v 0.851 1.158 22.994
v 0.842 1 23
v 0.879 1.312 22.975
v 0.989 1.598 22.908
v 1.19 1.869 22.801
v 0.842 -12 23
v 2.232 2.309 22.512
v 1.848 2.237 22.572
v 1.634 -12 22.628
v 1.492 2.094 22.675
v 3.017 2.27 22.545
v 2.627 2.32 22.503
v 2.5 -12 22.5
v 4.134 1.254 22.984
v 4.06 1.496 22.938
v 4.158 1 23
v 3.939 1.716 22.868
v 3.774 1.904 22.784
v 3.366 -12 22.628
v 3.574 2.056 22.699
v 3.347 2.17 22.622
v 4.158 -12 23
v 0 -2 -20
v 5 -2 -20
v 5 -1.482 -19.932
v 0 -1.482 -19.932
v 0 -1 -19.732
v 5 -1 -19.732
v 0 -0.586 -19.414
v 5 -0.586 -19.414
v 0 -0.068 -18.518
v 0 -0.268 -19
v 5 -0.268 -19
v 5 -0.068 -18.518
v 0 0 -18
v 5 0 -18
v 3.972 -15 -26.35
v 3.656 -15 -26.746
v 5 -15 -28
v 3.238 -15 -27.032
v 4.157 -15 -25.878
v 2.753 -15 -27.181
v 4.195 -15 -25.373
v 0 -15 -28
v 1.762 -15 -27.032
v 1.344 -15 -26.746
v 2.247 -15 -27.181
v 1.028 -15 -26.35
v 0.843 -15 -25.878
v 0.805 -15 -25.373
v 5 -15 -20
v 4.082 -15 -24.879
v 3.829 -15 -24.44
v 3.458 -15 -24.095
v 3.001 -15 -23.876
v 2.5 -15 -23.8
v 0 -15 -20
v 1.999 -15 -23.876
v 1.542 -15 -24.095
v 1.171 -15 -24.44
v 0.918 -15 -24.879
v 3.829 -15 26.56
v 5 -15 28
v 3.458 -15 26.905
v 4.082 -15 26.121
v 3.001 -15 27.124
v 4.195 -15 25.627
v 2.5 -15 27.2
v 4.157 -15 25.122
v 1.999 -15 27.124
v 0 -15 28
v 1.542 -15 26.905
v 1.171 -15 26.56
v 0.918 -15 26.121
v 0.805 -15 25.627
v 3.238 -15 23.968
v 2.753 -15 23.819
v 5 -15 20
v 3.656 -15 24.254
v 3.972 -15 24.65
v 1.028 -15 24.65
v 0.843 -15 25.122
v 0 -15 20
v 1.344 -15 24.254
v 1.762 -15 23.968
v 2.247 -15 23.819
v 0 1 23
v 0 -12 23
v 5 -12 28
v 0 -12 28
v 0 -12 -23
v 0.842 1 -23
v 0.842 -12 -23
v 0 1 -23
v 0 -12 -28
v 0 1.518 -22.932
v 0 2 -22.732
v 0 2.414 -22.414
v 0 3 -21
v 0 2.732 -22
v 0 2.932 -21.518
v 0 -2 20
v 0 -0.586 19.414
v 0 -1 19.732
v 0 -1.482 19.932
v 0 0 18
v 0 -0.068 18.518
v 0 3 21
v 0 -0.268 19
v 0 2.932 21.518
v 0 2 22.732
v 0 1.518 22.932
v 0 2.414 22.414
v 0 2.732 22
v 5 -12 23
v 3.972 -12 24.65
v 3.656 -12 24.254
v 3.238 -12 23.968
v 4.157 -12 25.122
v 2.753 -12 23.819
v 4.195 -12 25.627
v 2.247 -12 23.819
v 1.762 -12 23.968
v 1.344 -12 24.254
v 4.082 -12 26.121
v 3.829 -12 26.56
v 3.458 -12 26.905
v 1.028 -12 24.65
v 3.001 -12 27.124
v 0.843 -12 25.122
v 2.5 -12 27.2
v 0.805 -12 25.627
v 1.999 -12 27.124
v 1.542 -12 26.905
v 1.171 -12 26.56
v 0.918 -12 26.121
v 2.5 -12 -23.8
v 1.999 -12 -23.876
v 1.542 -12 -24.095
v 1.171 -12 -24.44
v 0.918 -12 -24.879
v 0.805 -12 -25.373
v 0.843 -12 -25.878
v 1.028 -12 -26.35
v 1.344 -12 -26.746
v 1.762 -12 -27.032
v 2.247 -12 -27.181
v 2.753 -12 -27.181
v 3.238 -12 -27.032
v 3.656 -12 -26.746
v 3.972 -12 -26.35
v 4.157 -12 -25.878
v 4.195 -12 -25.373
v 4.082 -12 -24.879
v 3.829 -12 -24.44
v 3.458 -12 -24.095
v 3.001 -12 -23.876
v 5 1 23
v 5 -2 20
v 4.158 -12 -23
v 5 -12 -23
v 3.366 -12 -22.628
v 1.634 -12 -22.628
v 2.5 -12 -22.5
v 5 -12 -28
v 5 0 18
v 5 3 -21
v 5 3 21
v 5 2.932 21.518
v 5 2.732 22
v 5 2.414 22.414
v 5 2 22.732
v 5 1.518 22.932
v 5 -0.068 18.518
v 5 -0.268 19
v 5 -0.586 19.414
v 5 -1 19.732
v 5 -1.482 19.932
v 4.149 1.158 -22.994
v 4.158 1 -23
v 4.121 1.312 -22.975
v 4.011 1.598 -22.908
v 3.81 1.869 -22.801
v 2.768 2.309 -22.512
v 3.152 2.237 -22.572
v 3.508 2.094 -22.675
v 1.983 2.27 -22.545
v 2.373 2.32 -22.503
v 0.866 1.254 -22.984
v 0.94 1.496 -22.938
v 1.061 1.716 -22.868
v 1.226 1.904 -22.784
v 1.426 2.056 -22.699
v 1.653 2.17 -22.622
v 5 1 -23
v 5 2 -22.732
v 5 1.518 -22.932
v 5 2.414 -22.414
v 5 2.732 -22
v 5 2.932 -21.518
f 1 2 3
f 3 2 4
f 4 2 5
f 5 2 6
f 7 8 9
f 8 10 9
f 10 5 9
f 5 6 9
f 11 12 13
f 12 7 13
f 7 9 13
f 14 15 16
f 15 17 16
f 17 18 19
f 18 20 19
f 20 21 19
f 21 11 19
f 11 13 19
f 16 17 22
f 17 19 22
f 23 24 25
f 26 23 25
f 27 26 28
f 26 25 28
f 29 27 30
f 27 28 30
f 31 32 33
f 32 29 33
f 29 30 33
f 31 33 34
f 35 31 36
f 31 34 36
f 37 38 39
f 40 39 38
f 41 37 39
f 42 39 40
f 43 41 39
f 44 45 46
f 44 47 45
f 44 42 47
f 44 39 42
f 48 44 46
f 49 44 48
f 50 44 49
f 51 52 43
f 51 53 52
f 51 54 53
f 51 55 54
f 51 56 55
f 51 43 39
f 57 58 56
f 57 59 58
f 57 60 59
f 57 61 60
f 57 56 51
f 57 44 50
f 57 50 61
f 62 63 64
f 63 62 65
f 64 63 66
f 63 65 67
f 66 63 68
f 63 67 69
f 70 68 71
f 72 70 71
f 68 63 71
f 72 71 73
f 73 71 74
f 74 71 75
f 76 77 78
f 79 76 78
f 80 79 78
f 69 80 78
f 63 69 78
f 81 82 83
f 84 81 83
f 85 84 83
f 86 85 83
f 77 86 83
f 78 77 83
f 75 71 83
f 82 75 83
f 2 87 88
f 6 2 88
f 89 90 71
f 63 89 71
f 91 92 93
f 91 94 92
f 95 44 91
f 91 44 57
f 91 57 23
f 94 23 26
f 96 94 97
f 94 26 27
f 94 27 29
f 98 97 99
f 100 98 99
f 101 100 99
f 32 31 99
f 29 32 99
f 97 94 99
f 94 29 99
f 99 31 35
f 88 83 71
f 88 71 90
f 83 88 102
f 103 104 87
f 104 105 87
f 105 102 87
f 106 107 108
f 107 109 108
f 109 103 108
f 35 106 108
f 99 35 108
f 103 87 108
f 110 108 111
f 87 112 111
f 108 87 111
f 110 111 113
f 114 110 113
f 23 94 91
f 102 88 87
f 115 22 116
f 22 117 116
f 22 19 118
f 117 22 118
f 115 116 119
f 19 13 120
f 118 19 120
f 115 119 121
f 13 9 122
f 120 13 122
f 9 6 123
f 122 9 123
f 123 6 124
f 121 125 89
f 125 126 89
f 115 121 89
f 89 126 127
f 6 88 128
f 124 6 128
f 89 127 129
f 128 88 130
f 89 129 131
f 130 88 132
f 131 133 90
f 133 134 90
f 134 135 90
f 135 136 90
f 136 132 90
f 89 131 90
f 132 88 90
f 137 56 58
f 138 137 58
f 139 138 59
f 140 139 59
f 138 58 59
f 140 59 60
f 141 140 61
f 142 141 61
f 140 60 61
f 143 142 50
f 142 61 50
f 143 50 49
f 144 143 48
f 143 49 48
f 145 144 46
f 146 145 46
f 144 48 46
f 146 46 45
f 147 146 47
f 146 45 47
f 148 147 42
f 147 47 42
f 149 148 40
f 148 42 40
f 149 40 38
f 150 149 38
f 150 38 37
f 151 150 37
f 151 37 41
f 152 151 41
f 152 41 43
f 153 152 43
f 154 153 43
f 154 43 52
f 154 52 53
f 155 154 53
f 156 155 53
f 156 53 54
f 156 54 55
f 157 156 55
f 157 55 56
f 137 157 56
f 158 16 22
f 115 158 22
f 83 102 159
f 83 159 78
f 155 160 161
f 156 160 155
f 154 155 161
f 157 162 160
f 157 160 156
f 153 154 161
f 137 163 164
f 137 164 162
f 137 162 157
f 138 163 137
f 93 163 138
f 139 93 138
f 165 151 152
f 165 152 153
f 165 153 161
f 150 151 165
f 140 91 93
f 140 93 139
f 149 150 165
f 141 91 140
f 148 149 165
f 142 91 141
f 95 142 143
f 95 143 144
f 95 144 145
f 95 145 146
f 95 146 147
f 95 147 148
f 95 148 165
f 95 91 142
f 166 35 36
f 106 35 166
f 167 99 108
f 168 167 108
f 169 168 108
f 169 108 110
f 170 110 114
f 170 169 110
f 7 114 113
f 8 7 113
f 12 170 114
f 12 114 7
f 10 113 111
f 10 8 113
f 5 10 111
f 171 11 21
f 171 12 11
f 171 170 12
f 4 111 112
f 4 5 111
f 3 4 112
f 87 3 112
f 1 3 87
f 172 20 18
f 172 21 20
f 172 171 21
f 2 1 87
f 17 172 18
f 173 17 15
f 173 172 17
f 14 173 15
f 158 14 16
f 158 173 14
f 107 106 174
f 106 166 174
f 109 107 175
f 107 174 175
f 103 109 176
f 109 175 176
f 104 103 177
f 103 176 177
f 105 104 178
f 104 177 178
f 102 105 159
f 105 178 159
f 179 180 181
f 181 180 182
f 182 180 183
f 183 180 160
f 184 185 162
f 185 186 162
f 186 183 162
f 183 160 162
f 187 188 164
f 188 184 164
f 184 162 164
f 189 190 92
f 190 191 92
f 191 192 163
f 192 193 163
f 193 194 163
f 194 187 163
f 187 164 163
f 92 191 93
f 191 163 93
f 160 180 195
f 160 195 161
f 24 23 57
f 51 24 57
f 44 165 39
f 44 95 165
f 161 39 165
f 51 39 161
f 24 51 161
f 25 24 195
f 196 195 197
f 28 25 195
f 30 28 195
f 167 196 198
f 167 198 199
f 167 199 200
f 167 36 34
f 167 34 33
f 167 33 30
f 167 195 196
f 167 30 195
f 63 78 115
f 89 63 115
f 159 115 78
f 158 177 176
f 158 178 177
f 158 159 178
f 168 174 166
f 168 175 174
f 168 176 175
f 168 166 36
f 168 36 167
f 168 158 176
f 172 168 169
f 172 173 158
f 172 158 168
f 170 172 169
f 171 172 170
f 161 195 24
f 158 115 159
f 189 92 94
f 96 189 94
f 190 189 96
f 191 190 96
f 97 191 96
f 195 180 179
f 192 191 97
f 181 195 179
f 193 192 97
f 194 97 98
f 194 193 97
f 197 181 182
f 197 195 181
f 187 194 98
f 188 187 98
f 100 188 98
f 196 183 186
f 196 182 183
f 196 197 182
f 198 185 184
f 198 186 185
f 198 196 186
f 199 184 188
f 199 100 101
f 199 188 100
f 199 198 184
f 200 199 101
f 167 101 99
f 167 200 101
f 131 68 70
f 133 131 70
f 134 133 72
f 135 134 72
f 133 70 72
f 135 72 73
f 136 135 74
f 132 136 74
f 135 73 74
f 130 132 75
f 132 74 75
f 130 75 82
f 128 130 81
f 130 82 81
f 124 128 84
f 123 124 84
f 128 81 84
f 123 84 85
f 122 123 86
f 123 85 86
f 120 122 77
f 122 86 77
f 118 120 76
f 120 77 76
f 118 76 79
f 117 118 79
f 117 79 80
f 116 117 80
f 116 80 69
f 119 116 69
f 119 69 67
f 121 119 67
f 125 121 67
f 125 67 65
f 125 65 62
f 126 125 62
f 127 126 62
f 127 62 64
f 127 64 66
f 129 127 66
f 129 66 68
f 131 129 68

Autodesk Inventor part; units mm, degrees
ref_plane "YZ Plane" through (0, 0, 0) normal (1, 0, 0) x (0, 1, 0)
ref_plane "XZ Plane" through (0, 0, 0) normal (0, 1, 0) x (-1, 0, 0)
ref_plane "XY Plane" through (0, 0, 0) normal (0, 0, 1) x (1, 0, 0)
sketch "Sketch1" plane through (0, 0, 0) normal (1, 0, 0) x (0, 1, 0)
  line L0 (0, 0) -> (0, 20)
  line L1 (0, 20) -> (-15, 20)
  line L2 (0, 0) -> (3, 0)
  line L3 (3, 0) -> (3, 23)
  line L4 (3, 23) -> (-12, 23)
  line L5 (-12, 23) -> (-12, 28)
  line L6 (-12, 28) -> (-15, 28)
  line L7 (-15, 28) -> (-15, 20)
  line L8 (3.6548, 0) -> (-1.246, 0)
  line L9 (0, 0) -> (0, -20)
  line L10 (0, -20) -> (-15, -20)
  line L11 (3, 0) -> (3, -23)
  line L12 (3, -23) -> (-12, -23)
  line L13 (-12, -23) -> (-12, -28)
  line L14 (-15, -28) -> (-15, -20)
  line L15 (-12, -28) -> (-15, -28)
  dimension "d0" = 20
  dimension "d1" = 15
  dimension "d2" = 3
  dimension "d3" = 23
  dimension "d4" = 15
  dimension "d5" = 5
extrude "Extrusion1" add sketch "Sketch1" along normal blind 5
sketch "Sketch2" plane through (0, -12, 28) normal (0, 1, 0) x (1, 0, 0)
  line L0 (0, 0) -> (0, 2.5)
  line L1 (0, 5) -> (0, 0) projected
  line L2 (0, 48) -> (0, 56) projected
  line L3 (0, 56) -> (0, 53.5)
  point P0 (0, 28)
  point P1 (2.5, 2.5)
  point P2 (2.5, 53.5)
  dimension "d8" = 2.5
  dimension "d9" = 2.5
hole "Hole1" at (2.5, -12, 25.5) at (2.5, -12, -25.5) direction (0, -1, 0) diameter 3.4 end through all clearance for "Countersunk Flat Head Screw ISO 2009/7046" size "M3" standard "ISO"
sketch "Sketch3" plane through (0, -12, 28) normal (0, 1, 0) x (1, 0, 0)
  circle A0 centre (2.5, 2.5) radius 1.7 projected
  circle A1 centre (2.5, 2.5) radius 3
  circle A2 centre (2.5, 53.5) radius 1.7 projected
  circle A3 centre (2.5, 53.5) radius 3
  point P0 (0, 28)
  dimension "d17" = 6
  dimension "d18" = 6
fillet "Fillet1" radius 2 4 edges at (2.5, 3, 23) (2.5, 0, 20) (2.5, 0, -20) (2.5, 3, -23)
extrude "Extrusion2" cut sketch "Sketch3" along normal blind 20
properties part number "esc-holder"
